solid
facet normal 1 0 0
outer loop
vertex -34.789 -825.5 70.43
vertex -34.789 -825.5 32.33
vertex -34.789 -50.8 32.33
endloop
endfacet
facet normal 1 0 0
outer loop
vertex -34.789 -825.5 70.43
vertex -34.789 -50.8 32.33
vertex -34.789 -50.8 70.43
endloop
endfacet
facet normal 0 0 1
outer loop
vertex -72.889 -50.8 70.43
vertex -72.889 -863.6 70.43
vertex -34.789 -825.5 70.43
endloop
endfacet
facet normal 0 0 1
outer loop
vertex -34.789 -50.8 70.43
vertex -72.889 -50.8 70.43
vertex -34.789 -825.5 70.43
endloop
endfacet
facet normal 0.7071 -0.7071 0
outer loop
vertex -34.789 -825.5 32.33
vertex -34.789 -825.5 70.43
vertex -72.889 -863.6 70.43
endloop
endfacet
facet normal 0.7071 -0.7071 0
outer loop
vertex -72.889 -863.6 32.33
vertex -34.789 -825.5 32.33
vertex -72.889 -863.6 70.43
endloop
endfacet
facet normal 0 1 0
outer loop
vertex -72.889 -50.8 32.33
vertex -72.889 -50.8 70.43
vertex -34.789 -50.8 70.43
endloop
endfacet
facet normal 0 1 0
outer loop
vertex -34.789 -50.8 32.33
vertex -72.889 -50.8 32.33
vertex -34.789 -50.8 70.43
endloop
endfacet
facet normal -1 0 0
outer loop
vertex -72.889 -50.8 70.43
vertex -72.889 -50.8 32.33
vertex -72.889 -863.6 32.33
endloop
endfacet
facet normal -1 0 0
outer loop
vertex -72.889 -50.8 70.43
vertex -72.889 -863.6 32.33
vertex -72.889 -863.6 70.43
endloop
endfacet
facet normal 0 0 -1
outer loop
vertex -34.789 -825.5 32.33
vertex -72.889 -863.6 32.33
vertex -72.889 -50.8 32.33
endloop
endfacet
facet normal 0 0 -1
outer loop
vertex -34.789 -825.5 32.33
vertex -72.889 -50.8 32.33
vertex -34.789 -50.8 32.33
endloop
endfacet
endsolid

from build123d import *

# Parameters (mm, degrees)
F0_W     = 38.1
F0_H     = 38.1
F1_DEPTH = 863.6
F3_DEPTH = 50.8
F4_DEPTH = 50.8


with BuildPart() as f1:
    # F0 (on Front) → F1 (new body)
    with BuildSketch(Plane.XZ):
        with Locations((-53.838724035, 51.380352813)):
            Rectangle(F0_W, F0_H)
    extrude(amount=F1_DEPTH)

    # F2 (on face) → F3 (cut)
    with BuildSketch(Plane.XY.offset(70.430352813)):
        Polygon((-34.788724035, -825.5), (-72.888724035, -863.6), (-34.788724035, -863.6), align=None)
    extrude(amount=-F3_DEPTH, mode=Mode.SUBTRACT)

    # F4 (cut): a face of the model
    f4_faces = [f1.faces().sort_by_distance(p)[0] for p in [
        (-53.838724035, 0, 51.380352813),
    ]]
    extrude(f4_faces, amount=-F4_DEPTH, mode=Mode.SUBTRACT)


solid = f1.part
